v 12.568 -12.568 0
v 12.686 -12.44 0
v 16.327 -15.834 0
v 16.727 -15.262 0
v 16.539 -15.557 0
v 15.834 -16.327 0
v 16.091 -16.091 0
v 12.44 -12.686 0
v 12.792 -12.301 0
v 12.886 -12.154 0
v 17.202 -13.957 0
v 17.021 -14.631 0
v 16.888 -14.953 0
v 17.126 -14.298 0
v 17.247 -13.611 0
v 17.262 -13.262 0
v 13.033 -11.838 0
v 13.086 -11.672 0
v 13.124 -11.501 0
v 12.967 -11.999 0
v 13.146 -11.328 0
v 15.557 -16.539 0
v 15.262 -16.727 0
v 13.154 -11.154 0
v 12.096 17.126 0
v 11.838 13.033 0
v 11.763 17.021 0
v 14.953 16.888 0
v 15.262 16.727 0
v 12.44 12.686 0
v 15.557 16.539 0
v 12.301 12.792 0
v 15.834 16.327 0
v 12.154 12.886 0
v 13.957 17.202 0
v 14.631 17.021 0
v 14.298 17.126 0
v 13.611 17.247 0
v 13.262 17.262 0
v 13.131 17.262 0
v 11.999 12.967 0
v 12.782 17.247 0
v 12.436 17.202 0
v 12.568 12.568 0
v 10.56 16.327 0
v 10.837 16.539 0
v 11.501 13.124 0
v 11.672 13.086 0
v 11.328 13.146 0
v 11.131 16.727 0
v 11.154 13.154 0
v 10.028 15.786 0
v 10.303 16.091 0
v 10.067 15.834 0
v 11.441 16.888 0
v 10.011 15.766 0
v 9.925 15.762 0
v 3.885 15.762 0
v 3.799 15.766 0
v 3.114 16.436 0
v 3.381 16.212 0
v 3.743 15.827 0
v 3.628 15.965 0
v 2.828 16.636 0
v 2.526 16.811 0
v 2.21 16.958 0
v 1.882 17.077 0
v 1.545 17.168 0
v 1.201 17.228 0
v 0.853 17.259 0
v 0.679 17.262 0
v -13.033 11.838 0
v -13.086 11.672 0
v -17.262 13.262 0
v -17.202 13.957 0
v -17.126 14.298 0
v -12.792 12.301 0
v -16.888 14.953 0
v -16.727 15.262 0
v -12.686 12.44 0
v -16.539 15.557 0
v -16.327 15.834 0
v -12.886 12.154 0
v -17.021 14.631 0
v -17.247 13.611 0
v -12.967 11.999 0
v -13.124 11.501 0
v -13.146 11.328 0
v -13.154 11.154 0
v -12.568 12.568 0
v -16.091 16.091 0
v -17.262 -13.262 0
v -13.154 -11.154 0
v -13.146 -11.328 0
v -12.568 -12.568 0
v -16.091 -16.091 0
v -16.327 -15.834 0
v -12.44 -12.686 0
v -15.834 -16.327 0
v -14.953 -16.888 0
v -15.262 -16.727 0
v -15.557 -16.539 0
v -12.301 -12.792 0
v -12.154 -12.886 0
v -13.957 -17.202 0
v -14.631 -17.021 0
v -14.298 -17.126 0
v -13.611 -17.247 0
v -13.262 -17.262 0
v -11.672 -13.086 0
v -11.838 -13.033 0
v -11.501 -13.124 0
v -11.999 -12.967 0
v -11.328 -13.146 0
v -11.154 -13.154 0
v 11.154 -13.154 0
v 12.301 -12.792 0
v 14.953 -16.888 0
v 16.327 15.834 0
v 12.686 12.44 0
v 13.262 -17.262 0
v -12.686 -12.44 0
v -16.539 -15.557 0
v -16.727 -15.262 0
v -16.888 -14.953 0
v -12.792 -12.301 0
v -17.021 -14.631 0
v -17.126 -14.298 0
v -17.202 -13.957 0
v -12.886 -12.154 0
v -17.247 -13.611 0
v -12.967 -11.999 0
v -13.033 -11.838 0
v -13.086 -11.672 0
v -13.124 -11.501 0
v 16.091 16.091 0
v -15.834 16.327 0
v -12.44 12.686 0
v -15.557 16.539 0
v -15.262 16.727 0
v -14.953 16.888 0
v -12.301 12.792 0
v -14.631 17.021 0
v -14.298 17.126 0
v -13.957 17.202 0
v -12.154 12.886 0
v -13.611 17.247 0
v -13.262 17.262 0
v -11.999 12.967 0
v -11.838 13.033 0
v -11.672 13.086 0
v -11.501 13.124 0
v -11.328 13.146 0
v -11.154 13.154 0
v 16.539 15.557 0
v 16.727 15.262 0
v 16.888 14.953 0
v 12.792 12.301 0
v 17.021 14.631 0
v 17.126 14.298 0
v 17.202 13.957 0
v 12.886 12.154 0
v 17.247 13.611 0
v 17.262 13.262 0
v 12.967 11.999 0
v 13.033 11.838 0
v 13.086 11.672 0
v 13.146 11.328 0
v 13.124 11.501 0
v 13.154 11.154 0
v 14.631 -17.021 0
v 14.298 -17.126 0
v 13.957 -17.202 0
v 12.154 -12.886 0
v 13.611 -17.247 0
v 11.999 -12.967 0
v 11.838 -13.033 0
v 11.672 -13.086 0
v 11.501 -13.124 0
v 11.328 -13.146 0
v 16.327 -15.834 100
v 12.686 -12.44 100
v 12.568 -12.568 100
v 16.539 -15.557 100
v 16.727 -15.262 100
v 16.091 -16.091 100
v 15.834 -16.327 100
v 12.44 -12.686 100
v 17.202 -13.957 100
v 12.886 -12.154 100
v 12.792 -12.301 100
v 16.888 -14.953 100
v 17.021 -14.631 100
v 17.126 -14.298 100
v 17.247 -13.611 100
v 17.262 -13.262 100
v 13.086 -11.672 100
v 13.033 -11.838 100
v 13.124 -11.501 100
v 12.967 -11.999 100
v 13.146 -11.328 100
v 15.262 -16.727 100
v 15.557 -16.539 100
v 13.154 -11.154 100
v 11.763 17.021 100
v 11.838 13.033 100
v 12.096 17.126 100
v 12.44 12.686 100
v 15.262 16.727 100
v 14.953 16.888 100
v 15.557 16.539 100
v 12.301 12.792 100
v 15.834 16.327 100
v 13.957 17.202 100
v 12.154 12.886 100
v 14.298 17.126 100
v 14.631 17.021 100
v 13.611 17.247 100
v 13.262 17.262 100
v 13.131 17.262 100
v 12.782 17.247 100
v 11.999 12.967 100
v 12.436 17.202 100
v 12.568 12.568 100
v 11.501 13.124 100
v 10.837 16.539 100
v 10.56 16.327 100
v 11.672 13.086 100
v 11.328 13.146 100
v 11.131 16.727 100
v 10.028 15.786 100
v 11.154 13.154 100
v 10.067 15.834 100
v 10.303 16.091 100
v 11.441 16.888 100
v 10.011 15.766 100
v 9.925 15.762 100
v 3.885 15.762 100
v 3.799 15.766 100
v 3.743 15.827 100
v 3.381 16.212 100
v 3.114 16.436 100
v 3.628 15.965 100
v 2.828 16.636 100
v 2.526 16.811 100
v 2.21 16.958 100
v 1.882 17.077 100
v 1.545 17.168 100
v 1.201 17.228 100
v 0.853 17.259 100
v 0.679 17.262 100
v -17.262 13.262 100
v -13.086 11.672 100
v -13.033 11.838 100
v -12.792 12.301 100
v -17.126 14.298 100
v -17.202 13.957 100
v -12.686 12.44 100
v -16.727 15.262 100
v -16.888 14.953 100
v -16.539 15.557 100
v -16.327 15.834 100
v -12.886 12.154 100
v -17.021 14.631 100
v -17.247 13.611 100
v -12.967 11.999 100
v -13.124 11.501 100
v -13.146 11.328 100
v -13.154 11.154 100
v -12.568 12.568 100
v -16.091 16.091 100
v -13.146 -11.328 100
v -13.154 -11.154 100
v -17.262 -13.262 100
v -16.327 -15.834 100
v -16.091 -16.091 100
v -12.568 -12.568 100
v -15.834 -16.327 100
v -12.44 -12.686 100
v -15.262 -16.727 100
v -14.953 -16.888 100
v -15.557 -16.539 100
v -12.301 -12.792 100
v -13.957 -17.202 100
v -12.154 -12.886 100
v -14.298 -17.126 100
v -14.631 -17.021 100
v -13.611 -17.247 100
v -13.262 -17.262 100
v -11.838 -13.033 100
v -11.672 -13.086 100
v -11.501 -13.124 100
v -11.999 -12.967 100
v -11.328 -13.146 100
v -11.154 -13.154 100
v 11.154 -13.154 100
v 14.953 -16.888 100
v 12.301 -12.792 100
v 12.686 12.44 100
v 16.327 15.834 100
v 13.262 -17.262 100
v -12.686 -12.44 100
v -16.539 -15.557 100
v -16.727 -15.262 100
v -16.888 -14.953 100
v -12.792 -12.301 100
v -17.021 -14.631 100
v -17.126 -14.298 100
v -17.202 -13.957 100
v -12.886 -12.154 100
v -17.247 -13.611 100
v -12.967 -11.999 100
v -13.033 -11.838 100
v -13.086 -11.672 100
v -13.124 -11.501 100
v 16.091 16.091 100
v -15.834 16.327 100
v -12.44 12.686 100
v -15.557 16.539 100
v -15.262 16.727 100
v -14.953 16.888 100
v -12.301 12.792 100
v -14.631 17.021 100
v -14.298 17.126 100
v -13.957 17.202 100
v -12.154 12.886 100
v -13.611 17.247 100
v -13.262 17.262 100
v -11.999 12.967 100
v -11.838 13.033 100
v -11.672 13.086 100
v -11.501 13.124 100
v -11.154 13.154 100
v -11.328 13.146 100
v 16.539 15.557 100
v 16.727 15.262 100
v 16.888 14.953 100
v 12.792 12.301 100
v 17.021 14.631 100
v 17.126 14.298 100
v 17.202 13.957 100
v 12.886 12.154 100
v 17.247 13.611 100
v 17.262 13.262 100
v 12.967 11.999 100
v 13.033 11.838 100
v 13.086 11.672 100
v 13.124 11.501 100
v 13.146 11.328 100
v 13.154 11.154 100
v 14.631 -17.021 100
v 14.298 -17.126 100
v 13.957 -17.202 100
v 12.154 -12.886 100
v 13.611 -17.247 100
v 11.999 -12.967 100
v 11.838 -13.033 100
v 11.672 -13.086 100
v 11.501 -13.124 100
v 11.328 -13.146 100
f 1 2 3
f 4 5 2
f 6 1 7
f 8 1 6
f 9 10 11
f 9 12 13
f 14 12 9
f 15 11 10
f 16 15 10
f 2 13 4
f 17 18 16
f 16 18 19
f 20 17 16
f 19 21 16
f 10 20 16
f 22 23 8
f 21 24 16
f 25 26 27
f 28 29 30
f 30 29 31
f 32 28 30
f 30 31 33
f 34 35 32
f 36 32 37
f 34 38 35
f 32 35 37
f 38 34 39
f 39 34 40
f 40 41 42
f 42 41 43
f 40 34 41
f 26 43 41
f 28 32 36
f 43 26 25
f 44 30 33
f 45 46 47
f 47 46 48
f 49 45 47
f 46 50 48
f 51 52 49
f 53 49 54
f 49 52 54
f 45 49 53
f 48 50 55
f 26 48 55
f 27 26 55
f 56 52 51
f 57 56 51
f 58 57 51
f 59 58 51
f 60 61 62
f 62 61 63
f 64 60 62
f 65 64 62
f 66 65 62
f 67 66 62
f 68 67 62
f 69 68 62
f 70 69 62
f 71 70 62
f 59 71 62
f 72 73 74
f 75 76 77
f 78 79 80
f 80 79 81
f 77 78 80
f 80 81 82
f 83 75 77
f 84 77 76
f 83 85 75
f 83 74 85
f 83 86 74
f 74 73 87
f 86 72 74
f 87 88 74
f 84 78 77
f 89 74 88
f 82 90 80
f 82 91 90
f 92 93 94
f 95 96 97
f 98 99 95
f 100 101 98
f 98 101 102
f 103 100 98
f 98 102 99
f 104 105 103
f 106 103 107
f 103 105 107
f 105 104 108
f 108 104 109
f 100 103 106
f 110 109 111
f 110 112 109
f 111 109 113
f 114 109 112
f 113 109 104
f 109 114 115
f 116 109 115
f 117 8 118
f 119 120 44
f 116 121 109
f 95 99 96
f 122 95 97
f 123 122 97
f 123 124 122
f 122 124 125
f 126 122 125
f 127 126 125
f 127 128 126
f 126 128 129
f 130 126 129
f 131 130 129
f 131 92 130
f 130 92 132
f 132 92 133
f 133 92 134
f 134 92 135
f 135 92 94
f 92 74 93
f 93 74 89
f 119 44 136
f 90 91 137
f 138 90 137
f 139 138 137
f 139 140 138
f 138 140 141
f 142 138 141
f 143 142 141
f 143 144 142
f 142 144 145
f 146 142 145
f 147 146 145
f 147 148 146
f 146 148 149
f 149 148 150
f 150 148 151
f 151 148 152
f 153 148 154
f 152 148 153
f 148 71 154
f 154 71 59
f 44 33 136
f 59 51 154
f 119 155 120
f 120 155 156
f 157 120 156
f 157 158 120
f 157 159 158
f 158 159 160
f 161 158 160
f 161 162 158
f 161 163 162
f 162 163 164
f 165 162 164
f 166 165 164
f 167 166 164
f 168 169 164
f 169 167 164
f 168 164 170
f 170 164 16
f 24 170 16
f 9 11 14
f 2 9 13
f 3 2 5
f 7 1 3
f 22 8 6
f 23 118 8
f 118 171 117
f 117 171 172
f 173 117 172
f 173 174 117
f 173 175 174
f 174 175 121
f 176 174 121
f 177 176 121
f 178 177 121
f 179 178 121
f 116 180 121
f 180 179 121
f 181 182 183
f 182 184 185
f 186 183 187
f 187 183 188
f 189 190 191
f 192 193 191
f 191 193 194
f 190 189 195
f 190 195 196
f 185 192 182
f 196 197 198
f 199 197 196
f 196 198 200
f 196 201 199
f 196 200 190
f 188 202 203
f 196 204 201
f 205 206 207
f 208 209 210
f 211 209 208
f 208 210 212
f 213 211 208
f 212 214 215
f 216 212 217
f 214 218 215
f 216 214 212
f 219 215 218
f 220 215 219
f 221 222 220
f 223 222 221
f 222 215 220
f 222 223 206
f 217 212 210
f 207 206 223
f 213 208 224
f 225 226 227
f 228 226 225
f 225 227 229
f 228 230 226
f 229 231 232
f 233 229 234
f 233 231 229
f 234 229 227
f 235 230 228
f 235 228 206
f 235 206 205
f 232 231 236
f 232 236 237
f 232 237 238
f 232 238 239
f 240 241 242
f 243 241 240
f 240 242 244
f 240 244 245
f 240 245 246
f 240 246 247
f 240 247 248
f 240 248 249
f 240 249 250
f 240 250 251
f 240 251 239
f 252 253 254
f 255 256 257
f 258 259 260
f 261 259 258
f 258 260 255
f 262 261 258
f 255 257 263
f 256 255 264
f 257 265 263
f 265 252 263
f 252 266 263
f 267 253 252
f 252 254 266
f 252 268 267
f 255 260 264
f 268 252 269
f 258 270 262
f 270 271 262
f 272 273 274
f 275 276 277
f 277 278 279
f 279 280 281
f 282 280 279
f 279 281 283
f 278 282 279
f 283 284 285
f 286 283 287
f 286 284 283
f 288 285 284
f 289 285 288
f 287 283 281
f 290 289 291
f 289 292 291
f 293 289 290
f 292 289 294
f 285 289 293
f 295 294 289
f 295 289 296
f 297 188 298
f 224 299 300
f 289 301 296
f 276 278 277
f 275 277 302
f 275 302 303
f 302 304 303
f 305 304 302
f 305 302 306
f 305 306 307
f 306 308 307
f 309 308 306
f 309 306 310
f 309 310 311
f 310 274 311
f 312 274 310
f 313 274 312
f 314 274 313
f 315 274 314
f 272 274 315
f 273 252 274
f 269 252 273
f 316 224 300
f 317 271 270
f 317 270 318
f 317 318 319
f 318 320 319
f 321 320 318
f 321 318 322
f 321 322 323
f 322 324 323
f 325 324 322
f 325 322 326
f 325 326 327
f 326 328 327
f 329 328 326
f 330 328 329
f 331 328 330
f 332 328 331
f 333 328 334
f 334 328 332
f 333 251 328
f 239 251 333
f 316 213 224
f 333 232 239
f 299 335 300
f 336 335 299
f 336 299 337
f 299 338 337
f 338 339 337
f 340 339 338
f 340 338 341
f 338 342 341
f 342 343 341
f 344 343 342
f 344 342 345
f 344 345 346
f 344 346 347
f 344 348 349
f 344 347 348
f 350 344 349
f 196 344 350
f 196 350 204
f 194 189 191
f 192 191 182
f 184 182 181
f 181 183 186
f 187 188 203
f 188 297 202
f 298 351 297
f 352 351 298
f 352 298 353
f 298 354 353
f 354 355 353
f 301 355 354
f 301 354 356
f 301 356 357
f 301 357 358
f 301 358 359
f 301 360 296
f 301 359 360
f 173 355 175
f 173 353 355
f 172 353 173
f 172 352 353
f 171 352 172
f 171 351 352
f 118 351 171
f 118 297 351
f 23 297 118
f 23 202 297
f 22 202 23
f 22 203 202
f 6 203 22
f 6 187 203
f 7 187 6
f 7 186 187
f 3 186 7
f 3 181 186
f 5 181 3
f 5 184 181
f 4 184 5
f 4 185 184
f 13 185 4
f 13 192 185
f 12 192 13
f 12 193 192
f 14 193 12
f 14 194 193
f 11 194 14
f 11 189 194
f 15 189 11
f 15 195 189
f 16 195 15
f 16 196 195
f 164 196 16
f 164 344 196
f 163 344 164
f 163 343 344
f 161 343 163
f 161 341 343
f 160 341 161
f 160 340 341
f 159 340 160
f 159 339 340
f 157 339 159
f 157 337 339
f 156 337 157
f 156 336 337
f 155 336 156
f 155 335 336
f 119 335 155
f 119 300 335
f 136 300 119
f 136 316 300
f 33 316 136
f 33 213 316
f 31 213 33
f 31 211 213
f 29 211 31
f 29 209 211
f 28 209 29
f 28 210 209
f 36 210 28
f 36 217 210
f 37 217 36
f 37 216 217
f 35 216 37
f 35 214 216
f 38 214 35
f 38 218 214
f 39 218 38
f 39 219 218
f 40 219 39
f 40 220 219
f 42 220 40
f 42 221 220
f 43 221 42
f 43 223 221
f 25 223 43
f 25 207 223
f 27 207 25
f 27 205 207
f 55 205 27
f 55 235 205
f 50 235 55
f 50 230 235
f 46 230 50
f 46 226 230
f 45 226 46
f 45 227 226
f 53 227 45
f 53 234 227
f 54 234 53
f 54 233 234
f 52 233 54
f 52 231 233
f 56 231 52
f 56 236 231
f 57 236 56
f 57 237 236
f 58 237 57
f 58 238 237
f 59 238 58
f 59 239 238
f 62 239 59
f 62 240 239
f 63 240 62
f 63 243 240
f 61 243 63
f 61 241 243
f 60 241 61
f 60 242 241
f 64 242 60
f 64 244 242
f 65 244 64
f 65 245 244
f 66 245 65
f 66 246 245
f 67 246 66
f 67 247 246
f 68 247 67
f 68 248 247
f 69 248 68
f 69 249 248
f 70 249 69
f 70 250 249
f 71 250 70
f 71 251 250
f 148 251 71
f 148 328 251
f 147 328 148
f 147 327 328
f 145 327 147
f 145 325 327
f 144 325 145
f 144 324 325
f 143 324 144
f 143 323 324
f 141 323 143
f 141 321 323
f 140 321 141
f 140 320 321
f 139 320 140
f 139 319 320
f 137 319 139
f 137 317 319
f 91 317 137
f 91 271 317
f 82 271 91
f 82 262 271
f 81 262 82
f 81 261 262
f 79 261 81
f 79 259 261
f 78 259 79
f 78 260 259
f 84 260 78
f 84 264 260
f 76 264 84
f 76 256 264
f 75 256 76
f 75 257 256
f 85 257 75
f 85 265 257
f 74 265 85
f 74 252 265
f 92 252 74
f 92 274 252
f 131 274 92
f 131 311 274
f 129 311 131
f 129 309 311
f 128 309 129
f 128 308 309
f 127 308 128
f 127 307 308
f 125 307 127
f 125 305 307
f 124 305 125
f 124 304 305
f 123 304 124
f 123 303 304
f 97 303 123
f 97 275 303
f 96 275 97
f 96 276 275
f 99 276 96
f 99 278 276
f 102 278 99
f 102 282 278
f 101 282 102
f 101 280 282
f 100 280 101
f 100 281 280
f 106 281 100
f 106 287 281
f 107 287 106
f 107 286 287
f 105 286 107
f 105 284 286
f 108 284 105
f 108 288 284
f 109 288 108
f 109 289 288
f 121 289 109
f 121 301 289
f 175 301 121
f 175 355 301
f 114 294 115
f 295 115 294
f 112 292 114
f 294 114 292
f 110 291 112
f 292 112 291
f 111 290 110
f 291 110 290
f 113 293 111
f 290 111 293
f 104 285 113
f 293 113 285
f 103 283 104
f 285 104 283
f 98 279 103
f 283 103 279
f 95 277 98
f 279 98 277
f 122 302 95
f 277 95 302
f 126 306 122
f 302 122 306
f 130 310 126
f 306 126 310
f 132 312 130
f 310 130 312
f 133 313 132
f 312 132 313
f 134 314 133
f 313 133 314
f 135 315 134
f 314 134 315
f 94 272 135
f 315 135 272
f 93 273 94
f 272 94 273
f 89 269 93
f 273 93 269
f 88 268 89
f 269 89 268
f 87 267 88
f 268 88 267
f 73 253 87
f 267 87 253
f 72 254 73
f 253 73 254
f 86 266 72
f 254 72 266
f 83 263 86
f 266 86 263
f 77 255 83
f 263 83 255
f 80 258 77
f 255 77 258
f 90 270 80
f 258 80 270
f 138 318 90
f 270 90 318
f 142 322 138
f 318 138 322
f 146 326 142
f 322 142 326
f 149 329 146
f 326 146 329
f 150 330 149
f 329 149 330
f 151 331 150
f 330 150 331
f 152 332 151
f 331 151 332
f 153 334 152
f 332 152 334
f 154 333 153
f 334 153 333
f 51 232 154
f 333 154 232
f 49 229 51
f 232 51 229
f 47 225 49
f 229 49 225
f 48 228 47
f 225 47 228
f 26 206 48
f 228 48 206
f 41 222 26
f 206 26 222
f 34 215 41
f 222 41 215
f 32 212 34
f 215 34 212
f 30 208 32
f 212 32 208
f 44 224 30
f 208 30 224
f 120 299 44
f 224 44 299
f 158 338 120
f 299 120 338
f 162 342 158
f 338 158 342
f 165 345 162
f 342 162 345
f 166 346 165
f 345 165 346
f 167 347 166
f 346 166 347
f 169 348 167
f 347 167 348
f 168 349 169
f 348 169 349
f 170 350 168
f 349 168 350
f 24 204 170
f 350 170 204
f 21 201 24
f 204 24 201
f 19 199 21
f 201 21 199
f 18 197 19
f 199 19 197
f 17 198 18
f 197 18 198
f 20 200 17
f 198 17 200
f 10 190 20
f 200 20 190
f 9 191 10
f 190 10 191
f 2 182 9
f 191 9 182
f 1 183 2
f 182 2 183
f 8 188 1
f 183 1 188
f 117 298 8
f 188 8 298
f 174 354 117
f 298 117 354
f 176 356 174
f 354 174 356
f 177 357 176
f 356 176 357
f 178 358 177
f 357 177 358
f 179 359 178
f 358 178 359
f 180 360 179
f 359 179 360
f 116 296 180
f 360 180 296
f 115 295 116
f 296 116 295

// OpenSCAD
/**
 Fits inside 1.5" steel tube, and outside 1" steel tube.
 This lets you slot a 1" steel tube like the existing handlebar adapter inside a 1.5" steel frame.
*/
$fs=0.1; $fa=5;
inch=25.4; // file units: mm

wiggle=0.2;

OD=1.375*inch-2*wiggle;
ID=1.02*inch+2*wiggle;

round=4;

module inside_15x15() {
	offset(r=+round) offset(r=-round)
	difference() {
		square([OD,OD],center=true);
		// Notch for weld
		translate([OD*0.2,OD*0.5])
			square([OD*0.18,3],center=true);
	}
}

module outside_1x1() {
	round=2;
	offset(r=+round) offset(r=-round)
	square([ID,ID],center=true);
}

module part_2D() {
	difference() {
		inside_15x15();
		outside_1x1();
	}
}

linear_extrude(height=100.0, convexity=4) part_2D();
